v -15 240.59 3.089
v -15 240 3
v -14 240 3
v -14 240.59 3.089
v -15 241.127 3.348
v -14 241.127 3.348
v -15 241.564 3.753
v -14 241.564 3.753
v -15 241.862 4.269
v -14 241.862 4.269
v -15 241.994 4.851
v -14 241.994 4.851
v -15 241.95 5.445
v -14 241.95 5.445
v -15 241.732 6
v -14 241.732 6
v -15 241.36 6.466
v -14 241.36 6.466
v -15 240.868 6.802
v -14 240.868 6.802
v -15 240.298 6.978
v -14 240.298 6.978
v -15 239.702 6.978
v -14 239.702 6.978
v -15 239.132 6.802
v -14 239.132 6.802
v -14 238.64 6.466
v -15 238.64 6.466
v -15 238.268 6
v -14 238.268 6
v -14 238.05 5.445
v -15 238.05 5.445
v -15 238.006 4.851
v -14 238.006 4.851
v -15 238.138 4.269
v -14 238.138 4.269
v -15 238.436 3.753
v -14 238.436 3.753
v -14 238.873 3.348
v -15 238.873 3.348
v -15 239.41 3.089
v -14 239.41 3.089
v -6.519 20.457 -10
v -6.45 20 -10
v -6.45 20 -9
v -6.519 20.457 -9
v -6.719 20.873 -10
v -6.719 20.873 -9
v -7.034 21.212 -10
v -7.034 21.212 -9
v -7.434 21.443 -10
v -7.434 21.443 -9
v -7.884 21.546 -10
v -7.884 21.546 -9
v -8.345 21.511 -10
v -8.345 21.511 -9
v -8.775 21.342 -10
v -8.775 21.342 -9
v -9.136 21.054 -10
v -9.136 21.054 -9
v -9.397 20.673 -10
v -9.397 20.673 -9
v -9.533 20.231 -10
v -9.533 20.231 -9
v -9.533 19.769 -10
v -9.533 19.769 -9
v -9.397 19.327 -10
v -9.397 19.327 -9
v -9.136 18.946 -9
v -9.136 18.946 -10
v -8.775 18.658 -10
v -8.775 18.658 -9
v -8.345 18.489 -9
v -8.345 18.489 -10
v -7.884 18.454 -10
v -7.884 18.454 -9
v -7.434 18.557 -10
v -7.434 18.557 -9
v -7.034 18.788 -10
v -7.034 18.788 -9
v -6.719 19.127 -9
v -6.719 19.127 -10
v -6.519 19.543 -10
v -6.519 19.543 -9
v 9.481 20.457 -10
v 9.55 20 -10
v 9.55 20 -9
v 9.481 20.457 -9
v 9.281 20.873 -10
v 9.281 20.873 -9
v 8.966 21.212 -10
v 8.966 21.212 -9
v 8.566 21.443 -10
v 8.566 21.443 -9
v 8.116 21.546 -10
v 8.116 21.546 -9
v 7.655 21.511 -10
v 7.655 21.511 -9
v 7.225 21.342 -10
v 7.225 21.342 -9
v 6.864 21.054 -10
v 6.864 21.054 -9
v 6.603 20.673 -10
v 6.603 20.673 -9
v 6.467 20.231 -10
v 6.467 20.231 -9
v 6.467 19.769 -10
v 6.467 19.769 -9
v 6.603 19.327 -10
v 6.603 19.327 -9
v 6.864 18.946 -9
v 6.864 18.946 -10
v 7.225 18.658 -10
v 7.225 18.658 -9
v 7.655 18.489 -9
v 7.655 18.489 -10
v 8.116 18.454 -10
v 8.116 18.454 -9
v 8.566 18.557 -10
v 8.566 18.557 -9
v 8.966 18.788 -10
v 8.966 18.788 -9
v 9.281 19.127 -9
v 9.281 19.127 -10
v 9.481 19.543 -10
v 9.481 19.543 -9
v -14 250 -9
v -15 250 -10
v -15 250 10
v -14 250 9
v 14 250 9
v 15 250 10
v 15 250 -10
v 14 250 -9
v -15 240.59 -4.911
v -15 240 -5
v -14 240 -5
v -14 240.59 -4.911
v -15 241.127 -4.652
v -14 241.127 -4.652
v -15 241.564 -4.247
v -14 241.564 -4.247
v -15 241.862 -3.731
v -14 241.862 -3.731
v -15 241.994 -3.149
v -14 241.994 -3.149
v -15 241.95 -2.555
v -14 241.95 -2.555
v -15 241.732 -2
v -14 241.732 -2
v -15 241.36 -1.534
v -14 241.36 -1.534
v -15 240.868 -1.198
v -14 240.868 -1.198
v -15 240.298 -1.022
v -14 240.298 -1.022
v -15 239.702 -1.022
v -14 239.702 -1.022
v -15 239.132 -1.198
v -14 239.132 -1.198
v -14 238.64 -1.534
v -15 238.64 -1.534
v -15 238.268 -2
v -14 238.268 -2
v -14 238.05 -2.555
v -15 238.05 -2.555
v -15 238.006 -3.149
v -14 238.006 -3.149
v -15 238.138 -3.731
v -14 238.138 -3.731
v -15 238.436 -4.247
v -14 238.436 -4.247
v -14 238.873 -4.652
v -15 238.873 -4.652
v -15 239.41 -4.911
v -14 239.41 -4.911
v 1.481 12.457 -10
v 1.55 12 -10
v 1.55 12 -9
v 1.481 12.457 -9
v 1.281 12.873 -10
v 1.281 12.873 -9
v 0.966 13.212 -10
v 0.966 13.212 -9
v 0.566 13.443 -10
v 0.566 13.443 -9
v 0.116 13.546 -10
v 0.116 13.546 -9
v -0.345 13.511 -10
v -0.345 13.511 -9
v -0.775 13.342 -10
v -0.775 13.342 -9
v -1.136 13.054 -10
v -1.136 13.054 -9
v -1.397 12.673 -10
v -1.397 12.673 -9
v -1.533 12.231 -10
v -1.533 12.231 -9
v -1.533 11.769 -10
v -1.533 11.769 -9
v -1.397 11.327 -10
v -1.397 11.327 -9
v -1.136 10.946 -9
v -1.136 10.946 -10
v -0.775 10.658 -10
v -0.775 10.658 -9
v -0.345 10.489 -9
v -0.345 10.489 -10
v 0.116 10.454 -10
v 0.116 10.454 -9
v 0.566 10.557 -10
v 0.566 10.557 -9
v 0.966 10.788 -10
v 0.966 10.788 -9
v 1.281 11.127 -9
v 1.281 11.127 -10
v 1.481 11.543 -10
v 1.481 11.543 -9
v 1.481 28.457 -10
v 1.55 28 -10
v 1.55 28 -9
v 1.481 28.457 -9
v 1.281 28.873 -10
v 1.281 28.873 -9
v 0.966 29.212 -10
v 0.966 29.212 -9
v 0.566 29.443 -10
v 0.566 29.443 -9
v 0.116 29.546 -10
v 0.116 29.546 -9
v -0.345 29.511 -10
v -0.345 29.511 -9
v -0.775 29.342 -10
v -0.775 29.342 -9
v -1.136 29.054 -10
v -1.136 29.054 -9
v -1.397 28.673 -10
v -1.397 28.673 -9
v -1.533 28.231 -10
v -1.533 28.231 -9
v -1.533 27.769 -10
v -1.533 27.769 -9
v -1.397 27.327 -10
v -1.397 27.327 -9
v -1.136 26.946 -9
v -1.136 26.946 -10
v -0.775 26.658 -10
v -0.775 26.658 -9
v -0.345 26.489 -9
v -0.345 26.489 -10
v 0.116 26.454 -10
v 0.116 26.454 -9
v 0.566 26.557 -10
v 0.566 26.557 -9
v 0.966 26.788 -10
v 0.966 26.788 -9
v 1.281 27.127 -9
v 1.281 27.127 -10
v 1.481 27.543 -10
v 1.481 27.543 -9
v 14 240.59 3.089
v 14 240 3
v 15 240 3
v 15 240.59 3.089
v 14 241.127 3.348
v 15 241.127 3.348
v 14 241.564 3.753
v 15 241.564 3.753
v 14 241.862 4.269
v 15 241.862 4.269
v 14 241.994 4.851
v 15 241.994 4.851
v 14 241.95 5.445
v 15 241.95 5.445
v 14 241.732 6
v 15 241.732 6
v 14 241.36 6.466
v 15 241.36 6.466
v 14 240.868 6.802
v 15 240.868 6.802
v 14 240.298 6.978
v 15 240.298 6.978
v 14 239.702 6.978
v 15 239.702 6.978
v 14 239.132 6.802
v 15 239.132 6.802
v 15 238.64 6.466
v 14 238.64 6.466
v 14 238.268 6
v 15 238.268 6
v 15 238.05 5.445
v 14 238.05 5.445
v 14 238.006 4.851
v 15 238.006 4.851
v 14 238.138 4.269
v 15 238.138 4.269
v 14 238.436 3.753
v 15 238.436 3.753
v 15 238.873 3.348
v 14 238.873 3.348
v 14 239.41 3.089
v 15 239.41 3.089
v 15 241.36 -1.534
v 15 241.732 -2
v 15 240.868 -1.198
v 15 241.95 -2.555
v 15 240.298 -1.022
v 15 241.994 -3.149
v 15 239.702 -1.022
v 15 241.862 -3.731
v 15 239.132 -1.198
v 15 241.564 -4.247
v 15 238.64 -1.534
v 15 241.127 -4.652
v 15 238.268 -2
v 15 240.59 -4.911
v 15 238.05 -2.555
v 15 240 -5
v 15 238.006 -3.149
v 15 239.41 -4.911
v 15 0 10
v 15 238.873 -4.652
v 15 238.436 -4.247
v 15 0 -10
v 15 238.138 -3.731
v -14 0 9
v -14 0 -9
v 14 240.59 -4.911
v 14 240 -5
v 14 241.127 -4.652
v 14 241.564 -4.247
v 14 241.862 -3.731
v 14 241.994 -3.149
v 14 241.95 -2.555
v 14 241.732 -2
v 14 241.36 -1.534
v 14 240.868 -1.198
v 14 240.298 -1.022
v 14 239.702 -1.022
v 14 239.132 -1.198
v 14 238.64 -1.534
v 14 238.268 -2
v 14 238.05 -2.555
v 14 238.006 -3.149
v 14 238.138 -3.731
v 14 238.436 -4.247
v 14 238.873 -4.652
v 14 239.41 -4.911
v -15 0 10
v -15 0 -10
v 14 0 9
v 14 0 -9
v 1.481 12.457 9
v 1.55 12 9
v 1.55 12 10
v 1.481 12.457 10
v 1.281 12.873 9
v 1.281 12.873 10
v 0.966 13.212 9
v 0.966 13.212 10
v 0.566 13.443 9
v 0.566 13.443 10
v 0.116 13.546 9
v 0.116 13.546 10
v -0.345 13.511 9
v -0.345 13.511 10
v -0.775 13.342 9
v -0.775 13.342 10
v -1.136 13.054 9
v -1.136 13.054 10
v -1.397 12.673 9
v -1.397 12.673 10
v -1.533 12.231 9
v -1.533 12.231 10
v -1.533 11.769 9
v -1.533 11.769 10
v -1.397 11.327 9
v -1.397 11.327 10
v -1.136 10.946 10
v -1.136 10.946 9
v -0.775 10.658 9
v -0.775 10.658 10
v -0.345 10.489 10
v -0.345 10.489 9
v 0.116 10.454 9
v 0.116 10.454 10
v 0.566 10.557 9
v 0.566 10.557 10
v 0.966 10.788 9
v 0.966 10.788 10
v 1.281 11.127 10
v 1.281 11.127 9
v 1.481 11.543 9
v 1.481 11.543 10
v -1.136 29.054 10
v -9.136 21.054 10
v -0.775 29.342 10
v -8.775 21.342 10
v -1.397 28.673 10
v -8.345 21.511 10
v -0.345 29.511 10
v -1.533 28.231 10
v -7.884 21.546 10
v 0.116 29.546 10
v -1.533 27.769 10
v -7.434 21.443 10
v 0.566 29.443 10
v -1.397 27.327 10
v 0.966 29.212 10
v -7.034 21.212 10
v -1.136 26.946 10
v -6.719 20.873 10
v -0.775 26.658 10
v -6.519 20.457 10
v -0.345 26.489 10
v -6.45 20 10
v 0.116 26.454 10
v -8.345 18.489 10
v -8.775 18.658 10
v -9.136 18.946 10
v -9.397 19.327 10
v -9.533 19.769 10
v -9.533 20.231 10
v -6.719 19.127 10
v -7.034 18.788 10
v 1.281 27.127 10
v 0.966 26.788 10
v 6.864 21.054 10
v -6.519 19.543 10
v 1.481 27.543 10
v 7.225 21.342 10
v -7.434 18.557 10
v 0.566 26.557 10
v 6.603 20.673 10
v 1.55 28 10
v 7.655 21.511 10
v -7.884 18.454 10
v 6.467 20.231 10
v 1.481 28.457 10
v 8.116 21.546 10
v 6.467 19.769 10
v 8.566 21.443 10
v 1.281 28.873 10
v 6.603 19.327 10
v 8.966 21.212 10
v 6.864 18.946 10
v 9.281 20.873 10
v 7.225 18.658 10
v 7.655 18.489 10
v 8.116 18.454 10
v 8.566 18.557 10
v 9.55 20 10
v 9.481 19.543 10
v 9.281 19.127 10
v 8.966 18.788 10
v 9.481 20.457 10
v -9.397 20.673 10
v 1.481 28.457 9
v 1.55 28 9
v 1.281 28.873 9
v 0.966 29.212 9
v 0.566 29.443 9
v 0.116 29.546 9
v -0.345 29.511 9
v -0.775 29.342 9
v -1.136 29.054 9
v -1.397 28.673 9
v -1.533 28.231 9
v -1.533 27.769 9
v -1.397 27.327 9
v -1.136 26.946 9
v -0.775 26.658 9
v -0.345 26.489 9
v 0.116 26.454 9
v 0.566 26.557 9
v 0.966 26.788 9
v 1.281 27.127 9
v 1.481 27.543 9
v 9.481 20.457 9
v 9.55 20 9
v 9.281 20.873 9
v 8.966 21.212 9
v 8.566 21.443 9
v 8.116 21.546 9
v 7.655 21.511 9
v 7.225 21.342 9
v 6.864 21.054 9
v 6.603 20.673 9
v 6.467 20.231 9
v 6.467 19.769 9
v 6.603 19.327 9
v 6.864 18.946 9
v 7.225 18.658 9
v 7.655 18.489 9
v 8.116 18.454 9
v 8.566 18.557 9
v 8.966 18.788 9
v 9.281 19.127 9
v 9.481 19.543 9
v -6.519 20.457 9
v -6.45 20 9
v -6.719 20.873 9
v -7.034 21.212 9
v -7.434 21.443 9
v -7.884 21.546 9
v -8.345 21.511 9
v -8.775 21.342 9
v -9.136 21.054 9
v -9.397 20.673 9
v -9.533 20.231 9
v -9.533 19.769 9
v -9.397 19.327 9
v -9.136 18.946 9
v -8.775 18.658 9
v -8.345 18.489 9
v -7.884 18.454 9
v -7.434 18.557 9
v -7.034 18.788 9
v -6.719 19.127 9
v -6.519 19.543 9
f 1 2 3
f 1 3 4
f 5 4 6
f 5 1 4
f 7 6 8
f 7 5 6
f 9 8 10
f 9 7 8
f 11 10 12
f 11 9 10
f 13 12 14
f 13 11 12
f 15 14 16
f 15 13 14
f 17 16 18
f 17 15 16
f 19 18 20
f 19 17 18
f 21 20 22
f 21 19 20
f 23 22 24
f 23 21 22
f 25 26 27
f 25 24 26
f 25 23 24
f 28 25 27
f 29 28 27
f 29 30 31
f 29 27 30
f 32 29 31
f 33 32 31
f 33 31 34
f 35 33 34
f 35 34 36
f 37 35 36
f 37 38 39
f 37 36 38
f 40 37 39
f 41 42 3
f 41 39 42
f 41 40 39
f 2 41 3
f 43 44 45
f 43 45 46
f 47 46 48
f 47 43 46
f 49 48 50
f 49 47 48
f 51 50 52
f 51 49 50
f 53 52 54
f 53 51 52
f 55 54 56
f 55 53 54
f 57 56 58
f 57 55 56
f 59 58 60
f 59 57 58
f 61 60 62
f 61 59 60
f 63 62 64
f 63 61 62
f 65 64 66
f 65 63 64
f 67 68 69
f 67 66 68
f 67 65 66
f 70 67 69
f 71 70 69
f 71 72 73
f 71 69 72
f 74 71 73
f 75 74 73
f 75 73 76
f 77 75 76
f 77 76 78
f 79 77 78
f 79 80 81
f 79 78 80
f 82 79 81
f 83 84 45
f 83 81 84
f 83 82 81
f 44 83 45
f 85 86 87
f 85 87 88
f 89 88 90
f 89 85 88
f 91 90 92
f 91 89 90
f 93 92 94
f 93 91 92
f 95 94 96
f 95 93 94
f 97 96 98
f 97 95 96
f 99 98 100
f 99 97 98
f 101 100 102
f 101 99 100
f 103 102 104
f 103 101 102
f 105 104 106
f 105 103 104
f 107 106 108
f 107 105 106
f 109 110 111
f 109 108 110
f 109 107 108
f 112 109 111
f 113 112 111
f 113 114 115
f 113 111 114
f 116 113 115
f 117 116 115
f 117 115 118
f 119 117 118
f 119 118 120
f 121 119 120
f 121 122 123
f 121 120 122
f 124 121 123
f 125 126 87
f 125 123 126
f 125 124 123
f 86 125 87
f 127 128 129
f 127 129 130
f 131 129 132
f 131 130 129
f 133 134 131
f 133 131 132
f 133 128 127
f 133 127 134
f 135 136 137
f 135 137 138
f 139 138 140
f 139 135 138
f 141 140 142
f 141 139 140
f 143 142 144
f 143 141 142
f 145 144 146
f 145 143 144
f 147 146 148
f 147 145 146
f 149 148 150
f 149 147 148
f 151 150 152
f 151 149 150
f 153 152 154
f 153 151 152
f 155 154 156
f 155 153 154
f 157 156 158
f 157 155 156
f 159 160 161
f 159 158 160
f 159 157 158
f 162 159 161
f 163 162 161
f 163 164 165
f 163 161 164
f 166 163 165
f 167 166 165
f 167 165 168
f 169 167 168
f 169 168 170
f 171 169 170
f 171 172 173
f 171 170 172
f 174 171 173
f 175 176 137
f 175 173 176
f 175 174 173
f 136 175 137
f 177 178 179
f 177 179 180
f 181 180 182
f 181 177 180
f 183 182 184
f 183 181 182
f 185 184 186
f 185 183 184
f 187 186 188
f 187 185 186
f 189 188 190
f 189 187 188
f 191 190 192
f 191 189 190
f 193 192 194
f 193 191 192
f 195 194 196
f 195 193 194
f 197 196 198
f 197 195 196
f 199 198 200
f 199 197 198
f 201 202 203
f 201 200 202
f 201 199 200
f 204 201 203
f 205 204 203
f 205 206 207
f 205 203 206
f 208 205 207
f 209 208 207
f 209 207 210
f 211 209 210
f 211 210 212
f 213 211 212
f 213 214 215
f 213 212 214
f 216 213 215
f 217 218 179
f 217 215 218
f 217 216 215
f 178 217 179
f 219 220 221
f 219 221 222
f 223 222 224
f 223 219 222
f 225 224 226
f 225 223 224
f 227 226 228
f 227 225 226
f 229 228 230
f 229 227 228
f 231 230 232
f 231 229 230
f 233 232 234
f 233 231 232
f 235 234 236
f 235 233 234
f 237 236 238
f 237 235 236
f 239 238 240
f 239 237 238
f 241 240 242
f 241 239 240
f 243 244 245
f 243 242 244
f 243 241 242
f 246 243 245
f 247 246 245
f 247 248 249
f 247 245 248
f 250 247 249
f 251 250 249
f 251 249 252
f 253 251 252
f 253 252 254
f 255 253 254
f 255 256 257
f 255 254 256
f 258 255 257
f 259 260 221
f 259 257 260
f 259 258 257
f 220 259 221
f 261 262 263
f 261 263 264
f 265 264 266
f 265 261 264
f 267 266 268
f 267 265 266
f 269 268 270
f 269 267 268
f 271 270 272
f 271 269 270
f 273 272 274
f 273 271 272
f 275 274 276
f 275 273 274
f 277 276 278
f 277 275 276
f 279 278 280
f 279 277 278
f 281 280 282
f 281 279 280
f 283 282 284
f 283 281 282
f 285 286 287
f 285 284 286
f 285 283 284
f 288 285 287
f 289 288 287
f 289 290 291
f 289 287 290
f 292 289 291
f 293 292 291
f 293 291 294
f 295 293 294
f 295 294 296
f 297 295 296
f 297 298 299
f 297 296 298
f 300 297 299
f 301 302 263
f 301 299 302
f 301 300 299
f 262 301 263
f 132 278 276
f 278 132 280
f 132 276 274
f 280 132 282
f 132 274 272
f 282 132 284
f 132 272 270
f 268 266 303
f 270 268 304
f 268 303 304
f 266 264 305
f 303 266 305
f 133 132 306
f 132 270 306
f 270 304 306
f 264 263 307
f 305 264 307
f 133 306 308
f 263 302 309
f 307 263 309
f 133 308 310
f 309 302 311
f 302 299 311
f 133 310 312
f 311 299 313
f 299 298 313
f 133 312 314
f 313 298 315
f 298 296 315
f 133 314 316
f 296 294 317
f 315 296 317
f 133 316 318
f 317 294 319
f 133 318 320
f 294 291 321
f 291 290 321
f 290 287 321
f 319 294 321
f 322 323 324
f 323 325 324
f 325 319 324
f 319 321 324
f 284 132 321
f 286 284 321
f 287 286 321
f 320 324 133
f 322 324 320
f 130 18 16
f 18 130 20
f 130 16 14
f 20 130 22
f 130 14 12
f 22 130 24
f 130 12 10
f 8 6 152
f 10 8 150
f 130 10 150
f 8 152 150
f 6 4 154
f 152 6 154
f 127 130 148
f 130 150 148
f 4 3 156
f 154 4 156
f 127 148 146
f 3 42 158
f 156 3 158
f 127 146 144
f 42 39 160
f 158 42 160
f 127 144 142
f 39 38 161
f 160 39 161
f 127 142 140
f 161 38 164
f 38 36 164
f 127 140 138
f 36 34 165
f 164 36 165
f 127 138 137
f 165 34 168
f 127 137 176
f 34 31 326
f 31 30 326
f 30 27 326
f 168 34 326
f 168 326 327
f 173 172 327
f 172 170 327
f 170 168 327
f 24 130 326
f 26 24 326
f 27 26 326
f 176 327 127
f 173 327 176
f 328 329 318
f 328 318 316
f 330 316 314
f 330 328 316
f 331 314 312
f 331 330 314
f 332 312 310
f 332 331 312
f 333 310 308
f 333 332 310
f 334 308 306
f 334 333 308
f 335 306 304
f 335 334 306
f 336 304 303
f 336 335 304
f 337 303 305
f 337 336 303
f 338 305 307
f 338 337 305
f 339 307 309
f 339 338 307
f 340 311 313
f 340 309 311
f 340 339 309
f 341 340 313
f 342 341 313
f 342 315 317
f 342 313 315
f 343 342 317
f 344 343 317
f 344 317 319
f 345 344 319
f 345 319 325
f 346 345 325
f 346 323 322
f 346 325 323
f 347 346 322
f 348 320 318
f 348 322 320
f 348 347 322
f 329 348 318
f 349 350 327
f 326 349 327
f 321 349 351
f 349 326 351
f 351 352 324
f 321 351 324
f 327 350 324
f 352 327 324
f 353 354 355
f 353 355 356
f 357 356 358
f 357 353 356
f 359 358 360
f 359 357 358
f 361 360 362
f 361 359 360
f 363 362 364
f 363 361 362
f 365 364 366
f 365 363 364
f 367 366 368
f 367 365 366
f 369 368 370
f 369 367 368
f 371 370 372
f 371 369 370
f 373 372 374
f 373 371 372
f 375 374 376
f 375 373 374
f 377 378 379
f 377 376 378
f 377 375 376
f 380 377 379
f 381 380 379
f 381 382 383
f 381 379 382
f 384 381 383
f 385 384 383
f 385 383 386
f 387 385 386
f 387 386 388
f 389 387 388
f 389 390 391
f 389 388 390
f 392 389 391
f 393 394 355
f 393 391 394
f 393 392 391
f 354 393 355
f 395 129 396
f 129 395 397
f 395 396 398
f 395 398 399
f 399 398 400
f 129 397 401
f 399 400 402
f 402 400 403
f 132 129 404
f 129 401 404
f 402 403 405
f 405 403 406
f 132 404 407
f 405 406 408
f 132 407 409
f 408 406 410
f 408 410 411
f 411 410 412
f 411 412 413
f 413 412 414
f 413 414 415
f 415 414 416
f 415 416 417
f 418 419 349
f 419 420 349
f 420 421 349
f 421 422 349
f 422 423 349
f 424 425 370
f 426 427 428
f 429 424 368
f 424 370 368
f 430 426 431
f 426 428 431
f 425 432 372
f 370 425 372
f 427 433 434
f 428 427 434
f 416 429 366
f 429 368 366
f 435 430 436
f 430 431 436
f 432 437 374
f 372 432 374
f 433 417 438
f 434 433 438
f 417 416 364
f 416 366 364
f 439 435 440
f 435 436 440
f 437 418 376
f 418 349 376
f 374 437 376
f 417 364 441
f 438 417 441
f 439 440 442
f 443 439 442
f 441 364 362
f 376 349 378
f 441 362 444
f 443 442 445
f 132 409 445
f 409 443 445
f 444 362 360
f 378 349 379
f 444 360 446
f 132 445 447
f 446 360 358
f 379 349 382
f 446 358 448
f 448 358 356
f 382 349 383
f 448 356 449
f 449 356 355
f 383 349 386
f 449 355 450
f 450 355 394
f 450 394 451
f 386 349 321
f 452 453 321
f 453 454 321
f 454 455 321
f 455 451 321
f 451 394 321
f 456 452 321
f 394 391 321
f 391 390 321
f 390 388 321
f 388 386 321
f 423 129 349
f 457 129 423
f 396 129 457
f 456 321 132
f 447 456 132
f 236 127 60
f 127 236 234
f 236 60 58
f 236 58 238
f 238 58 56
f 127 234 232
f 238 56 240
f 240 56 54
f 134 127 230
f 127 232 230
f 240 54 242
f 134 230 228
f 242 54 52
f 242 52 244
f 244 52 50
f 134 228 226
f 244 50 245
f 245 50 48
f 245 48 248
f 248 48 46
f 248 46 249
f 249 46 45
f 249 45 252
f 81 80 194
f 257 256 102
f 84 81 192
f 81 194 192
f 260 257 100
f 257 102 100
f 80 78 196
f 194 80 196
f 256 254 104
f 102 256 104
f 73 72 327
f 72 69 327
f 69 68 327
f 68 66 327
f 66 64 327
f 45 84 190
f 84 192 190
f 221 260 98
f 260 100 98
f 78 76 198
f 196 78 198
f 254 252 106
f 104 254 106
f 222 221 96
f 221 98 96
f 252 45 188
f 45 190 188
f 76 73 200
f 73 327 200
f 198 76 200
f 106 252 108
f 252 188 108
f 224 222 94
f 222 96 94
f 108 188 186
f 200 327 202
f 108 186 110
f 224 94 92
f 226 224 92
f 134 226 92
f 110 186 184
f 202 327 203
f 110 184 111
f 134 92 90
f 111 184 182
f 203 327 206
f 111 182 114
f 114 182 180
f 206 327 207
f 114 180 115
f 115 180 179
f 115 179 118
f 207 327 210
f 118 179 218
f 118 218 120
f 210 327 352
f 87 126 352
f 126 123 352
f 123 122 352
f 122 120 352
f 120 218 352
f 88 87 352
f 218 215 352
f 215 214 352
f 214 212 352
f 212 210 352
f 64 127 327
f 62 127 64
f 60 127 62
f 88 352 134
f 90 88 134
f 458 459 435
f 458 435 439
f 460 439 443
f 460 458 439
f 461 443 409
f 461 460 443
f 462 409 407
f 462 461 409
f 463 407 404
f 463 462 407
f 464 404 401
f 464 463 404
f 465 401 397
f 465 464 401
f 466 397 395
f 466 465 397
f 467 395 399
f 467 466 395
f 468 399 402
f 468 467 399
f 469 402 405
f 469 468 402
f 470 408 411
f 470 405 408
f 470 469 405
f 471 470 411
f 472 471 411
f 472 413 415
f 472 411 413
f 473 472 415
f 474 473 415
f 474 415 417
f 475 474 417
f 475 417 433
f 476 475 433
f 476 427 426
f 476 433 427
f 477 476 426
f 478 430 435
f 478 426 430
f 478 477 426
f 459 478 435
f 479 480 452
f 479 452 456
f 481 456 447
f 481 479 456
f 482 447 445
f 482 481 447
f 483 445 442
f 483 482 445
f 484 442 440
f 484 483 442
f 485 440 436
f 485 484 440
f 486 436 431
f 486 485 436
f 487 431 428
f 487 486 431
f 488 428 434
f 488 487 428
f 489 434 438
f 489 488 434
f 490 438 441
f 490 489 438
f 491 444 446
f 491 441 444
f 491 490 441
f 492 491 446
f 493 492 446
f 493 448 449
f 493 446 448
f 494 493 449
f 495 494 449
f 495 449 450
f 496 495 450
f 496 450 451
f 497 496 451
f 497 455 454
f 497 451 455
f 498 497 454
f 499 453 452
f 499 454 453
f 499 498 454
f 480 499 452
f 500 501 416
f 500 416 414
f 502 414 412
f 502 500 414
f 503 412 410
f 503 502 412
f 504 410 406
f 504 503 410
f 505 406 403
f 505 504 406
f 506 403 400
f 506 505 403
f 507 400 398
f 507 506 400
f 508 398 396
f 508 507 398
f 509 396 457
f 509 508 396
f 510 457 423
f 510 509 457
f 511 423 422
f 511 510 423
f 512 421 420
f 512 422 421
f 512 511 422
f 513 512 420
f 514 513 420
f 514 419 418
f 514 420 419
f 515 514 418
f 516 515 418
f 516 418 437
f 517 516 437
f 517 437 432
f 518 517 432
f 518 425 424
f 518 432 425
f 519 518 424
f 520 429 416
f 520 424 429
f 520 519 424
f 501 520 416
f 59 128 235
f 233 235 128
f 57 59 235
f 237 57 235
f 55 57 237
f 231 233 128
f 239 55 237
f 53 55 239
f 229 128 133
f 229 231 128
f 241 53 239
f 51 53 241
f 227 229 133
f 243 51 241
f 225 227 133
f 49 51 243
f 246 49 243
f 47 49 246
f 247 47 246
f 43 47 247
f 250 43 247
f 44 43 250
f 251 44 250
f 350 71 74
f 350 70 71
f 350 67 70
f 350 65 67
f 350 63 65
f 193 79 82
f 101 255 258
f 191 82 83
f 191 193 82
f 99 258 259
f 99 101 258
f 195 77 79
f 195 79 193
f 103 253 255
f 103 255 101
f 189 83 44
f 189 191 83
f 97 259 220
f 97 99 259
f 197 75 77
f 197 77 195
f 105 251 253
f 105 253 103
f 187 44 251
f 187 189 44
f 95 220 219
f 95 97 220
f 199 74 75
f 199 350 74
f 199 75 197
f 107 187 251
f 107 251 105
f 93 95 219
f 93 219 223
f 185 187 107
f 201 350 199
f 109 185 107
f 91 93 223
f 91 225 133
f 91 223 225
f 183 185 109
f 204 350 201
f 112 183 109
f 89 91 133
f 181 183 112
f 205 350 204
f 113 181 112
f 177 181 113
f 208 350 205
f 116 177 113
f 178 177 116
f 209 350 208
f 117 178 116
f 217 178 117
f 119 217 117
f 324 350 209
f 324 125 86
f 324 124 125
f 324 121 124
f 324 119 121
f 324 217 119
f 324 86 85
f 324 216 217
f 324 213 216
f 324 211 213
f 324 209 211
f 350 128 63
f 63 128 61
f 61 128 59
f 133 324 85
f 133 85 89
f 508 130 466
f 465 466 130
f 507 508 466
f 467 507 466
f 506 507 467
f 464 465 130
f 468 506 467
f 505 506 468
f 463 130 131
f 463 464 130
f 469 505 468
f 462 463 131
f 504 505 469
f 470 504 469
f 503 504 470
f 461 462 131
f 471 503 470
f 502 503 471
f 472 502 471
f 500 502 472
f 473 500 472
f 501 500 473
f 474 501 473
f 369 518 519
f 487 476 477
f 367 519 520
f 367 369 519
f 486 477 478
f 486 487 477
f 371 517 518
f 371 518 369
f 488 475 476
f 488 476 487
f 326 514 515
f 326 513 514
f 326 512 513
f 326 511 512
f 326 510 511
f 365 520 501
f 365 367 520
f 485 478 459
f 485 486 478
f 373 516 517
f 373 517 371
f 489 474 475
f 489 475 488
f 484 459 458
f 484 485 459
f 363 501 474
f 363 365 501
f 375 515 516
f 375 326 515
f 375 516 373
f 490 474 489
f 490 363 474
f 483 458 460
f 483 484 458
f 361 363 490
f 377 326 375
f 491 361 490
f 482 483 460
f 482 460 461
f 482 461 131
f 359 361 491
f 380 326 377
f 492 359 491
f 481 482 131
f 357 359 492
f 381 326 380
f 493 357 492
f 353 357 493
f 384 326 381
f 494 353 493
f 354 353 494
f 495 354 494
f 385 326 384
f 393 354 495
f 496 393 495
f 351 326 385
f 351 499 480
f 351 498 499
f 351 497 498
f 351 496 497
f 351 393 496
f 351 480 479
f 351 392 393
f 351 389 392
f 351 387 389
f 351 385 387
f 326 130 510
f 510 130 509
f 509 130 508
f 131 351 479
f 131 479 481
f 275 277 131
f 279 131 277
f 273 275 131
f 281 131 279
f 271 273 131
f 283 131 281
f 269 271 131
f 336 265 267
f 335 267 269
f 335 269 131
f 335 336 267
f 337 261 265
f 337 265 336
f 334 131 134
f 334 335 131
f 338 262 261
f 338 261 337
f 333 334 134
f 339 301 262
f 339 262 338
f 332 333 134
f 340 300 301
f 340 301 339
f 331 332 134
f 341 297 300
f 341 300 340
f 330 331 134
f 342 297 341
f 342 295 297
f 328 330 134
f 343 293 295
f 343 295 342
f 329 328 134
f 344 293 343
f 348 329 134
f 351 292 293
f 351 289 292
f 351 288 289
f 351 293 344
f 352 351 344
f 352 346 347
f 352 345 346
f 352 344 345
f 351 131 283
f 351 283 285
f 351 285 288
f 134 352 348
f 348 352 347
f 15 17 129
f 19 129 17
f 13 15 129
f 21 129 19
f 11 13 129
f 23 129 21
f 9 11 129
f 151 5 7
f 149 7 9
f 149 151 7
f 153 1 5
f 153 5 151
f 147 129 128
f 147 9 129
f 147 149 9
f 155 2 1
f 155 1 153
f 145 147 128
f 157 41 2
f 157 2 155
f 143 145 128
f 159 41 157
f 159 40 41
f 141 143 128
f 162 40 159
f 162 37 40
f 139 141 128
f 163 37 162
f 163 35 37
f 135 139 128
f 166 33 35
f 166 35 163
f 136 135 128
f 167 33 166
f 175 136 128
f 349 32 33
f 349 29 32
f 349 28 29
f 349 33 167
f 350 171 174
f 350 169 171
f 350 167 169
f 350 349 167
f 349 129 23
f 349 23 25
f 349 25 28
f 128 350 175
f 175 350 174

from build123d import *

# Parameters (mm, degrees)
SKETCH_1_W               = 30
SKETCH_1_H               = 20
SKETCH_1_W_2             = 28
SKETCH_1_H_2             = 18
EXTRUDE_1_DEPTH          = 250
CUT_EXTRUDE_1_DEPTH      = 251.64915719
CUT_EXTRUDE_1_DEPTH_BACK = 251.64915719
SKETCH_2_R               = 1.55
CUT_EXTRUDE_2_DEPTH      = 251.64915719
CUT_EXTRUDE_2_DEPTH_BACK = 251.64915719
SKETCH_3_R               = 2


with BuildPart() as part:
    # 草图1 → 凸台-拉伸1 (new body)
    with BuildSketch(Plane(origin=(0, 0, 0), x_dir=(1, 0, 0), z_dir=(0, 1, 0))):
        Rectangle(SKETCH_1_W, SKETCH_1_H)
        Rectangle(SKETCH_1_W_2, SKETCH_1_H_2, mode=Mode.SUBTRACT)
    extrude(amount=EXTRUDE_1_DEPTH)

    # 草图2 → 切除-拉伸1 (cut, two sides: drawn at the far end of the back side and taken through both)
    with BuildSketch(Plane.XY.offset(-CUT_EXTRUDE_1_DEPTH_BACK)):
        with Locations((0, 28)):
            Circle(SKETCH_2_R)
        with Locations((8, 20)):
            Circle(SKETCH_2_R)
        with Locations((0, 12)):
            Circle(SKETCH_2_R)
        with Locations((-8, 20)):
            Circle(SKETCH_2_R)
    extrude(amount=CUT_EXTRUDE_1_DEPTH + CUT_EXTRUDE_1_DEPTH_BACK, mode=Mode.SUBTRACT)

    # 草图3 → 切除-拉伸2 (cut, two sides: drawn at the far end of the back side and taken through both)
    with BuildSketch(Plane(origin=(0, 0, 0), x_dir=(0, 0, -1), z_dir=(1, 0, 0)).offset(-CUT_EXTRUDE_2_DEPTH_BACK)):
        with Locations((-5, 240)):
            Circle(SKETCH_3_R)
        with Locations((3, 240)):
            Circle(SKETCH_3_R)
    extrude(amount=CUT_EXTRUDE_2_DEPTH + CUT_EXTRUDE_2_DEPTH_BACK, mode=Mode.SUBTRACT)


solid = part.part
